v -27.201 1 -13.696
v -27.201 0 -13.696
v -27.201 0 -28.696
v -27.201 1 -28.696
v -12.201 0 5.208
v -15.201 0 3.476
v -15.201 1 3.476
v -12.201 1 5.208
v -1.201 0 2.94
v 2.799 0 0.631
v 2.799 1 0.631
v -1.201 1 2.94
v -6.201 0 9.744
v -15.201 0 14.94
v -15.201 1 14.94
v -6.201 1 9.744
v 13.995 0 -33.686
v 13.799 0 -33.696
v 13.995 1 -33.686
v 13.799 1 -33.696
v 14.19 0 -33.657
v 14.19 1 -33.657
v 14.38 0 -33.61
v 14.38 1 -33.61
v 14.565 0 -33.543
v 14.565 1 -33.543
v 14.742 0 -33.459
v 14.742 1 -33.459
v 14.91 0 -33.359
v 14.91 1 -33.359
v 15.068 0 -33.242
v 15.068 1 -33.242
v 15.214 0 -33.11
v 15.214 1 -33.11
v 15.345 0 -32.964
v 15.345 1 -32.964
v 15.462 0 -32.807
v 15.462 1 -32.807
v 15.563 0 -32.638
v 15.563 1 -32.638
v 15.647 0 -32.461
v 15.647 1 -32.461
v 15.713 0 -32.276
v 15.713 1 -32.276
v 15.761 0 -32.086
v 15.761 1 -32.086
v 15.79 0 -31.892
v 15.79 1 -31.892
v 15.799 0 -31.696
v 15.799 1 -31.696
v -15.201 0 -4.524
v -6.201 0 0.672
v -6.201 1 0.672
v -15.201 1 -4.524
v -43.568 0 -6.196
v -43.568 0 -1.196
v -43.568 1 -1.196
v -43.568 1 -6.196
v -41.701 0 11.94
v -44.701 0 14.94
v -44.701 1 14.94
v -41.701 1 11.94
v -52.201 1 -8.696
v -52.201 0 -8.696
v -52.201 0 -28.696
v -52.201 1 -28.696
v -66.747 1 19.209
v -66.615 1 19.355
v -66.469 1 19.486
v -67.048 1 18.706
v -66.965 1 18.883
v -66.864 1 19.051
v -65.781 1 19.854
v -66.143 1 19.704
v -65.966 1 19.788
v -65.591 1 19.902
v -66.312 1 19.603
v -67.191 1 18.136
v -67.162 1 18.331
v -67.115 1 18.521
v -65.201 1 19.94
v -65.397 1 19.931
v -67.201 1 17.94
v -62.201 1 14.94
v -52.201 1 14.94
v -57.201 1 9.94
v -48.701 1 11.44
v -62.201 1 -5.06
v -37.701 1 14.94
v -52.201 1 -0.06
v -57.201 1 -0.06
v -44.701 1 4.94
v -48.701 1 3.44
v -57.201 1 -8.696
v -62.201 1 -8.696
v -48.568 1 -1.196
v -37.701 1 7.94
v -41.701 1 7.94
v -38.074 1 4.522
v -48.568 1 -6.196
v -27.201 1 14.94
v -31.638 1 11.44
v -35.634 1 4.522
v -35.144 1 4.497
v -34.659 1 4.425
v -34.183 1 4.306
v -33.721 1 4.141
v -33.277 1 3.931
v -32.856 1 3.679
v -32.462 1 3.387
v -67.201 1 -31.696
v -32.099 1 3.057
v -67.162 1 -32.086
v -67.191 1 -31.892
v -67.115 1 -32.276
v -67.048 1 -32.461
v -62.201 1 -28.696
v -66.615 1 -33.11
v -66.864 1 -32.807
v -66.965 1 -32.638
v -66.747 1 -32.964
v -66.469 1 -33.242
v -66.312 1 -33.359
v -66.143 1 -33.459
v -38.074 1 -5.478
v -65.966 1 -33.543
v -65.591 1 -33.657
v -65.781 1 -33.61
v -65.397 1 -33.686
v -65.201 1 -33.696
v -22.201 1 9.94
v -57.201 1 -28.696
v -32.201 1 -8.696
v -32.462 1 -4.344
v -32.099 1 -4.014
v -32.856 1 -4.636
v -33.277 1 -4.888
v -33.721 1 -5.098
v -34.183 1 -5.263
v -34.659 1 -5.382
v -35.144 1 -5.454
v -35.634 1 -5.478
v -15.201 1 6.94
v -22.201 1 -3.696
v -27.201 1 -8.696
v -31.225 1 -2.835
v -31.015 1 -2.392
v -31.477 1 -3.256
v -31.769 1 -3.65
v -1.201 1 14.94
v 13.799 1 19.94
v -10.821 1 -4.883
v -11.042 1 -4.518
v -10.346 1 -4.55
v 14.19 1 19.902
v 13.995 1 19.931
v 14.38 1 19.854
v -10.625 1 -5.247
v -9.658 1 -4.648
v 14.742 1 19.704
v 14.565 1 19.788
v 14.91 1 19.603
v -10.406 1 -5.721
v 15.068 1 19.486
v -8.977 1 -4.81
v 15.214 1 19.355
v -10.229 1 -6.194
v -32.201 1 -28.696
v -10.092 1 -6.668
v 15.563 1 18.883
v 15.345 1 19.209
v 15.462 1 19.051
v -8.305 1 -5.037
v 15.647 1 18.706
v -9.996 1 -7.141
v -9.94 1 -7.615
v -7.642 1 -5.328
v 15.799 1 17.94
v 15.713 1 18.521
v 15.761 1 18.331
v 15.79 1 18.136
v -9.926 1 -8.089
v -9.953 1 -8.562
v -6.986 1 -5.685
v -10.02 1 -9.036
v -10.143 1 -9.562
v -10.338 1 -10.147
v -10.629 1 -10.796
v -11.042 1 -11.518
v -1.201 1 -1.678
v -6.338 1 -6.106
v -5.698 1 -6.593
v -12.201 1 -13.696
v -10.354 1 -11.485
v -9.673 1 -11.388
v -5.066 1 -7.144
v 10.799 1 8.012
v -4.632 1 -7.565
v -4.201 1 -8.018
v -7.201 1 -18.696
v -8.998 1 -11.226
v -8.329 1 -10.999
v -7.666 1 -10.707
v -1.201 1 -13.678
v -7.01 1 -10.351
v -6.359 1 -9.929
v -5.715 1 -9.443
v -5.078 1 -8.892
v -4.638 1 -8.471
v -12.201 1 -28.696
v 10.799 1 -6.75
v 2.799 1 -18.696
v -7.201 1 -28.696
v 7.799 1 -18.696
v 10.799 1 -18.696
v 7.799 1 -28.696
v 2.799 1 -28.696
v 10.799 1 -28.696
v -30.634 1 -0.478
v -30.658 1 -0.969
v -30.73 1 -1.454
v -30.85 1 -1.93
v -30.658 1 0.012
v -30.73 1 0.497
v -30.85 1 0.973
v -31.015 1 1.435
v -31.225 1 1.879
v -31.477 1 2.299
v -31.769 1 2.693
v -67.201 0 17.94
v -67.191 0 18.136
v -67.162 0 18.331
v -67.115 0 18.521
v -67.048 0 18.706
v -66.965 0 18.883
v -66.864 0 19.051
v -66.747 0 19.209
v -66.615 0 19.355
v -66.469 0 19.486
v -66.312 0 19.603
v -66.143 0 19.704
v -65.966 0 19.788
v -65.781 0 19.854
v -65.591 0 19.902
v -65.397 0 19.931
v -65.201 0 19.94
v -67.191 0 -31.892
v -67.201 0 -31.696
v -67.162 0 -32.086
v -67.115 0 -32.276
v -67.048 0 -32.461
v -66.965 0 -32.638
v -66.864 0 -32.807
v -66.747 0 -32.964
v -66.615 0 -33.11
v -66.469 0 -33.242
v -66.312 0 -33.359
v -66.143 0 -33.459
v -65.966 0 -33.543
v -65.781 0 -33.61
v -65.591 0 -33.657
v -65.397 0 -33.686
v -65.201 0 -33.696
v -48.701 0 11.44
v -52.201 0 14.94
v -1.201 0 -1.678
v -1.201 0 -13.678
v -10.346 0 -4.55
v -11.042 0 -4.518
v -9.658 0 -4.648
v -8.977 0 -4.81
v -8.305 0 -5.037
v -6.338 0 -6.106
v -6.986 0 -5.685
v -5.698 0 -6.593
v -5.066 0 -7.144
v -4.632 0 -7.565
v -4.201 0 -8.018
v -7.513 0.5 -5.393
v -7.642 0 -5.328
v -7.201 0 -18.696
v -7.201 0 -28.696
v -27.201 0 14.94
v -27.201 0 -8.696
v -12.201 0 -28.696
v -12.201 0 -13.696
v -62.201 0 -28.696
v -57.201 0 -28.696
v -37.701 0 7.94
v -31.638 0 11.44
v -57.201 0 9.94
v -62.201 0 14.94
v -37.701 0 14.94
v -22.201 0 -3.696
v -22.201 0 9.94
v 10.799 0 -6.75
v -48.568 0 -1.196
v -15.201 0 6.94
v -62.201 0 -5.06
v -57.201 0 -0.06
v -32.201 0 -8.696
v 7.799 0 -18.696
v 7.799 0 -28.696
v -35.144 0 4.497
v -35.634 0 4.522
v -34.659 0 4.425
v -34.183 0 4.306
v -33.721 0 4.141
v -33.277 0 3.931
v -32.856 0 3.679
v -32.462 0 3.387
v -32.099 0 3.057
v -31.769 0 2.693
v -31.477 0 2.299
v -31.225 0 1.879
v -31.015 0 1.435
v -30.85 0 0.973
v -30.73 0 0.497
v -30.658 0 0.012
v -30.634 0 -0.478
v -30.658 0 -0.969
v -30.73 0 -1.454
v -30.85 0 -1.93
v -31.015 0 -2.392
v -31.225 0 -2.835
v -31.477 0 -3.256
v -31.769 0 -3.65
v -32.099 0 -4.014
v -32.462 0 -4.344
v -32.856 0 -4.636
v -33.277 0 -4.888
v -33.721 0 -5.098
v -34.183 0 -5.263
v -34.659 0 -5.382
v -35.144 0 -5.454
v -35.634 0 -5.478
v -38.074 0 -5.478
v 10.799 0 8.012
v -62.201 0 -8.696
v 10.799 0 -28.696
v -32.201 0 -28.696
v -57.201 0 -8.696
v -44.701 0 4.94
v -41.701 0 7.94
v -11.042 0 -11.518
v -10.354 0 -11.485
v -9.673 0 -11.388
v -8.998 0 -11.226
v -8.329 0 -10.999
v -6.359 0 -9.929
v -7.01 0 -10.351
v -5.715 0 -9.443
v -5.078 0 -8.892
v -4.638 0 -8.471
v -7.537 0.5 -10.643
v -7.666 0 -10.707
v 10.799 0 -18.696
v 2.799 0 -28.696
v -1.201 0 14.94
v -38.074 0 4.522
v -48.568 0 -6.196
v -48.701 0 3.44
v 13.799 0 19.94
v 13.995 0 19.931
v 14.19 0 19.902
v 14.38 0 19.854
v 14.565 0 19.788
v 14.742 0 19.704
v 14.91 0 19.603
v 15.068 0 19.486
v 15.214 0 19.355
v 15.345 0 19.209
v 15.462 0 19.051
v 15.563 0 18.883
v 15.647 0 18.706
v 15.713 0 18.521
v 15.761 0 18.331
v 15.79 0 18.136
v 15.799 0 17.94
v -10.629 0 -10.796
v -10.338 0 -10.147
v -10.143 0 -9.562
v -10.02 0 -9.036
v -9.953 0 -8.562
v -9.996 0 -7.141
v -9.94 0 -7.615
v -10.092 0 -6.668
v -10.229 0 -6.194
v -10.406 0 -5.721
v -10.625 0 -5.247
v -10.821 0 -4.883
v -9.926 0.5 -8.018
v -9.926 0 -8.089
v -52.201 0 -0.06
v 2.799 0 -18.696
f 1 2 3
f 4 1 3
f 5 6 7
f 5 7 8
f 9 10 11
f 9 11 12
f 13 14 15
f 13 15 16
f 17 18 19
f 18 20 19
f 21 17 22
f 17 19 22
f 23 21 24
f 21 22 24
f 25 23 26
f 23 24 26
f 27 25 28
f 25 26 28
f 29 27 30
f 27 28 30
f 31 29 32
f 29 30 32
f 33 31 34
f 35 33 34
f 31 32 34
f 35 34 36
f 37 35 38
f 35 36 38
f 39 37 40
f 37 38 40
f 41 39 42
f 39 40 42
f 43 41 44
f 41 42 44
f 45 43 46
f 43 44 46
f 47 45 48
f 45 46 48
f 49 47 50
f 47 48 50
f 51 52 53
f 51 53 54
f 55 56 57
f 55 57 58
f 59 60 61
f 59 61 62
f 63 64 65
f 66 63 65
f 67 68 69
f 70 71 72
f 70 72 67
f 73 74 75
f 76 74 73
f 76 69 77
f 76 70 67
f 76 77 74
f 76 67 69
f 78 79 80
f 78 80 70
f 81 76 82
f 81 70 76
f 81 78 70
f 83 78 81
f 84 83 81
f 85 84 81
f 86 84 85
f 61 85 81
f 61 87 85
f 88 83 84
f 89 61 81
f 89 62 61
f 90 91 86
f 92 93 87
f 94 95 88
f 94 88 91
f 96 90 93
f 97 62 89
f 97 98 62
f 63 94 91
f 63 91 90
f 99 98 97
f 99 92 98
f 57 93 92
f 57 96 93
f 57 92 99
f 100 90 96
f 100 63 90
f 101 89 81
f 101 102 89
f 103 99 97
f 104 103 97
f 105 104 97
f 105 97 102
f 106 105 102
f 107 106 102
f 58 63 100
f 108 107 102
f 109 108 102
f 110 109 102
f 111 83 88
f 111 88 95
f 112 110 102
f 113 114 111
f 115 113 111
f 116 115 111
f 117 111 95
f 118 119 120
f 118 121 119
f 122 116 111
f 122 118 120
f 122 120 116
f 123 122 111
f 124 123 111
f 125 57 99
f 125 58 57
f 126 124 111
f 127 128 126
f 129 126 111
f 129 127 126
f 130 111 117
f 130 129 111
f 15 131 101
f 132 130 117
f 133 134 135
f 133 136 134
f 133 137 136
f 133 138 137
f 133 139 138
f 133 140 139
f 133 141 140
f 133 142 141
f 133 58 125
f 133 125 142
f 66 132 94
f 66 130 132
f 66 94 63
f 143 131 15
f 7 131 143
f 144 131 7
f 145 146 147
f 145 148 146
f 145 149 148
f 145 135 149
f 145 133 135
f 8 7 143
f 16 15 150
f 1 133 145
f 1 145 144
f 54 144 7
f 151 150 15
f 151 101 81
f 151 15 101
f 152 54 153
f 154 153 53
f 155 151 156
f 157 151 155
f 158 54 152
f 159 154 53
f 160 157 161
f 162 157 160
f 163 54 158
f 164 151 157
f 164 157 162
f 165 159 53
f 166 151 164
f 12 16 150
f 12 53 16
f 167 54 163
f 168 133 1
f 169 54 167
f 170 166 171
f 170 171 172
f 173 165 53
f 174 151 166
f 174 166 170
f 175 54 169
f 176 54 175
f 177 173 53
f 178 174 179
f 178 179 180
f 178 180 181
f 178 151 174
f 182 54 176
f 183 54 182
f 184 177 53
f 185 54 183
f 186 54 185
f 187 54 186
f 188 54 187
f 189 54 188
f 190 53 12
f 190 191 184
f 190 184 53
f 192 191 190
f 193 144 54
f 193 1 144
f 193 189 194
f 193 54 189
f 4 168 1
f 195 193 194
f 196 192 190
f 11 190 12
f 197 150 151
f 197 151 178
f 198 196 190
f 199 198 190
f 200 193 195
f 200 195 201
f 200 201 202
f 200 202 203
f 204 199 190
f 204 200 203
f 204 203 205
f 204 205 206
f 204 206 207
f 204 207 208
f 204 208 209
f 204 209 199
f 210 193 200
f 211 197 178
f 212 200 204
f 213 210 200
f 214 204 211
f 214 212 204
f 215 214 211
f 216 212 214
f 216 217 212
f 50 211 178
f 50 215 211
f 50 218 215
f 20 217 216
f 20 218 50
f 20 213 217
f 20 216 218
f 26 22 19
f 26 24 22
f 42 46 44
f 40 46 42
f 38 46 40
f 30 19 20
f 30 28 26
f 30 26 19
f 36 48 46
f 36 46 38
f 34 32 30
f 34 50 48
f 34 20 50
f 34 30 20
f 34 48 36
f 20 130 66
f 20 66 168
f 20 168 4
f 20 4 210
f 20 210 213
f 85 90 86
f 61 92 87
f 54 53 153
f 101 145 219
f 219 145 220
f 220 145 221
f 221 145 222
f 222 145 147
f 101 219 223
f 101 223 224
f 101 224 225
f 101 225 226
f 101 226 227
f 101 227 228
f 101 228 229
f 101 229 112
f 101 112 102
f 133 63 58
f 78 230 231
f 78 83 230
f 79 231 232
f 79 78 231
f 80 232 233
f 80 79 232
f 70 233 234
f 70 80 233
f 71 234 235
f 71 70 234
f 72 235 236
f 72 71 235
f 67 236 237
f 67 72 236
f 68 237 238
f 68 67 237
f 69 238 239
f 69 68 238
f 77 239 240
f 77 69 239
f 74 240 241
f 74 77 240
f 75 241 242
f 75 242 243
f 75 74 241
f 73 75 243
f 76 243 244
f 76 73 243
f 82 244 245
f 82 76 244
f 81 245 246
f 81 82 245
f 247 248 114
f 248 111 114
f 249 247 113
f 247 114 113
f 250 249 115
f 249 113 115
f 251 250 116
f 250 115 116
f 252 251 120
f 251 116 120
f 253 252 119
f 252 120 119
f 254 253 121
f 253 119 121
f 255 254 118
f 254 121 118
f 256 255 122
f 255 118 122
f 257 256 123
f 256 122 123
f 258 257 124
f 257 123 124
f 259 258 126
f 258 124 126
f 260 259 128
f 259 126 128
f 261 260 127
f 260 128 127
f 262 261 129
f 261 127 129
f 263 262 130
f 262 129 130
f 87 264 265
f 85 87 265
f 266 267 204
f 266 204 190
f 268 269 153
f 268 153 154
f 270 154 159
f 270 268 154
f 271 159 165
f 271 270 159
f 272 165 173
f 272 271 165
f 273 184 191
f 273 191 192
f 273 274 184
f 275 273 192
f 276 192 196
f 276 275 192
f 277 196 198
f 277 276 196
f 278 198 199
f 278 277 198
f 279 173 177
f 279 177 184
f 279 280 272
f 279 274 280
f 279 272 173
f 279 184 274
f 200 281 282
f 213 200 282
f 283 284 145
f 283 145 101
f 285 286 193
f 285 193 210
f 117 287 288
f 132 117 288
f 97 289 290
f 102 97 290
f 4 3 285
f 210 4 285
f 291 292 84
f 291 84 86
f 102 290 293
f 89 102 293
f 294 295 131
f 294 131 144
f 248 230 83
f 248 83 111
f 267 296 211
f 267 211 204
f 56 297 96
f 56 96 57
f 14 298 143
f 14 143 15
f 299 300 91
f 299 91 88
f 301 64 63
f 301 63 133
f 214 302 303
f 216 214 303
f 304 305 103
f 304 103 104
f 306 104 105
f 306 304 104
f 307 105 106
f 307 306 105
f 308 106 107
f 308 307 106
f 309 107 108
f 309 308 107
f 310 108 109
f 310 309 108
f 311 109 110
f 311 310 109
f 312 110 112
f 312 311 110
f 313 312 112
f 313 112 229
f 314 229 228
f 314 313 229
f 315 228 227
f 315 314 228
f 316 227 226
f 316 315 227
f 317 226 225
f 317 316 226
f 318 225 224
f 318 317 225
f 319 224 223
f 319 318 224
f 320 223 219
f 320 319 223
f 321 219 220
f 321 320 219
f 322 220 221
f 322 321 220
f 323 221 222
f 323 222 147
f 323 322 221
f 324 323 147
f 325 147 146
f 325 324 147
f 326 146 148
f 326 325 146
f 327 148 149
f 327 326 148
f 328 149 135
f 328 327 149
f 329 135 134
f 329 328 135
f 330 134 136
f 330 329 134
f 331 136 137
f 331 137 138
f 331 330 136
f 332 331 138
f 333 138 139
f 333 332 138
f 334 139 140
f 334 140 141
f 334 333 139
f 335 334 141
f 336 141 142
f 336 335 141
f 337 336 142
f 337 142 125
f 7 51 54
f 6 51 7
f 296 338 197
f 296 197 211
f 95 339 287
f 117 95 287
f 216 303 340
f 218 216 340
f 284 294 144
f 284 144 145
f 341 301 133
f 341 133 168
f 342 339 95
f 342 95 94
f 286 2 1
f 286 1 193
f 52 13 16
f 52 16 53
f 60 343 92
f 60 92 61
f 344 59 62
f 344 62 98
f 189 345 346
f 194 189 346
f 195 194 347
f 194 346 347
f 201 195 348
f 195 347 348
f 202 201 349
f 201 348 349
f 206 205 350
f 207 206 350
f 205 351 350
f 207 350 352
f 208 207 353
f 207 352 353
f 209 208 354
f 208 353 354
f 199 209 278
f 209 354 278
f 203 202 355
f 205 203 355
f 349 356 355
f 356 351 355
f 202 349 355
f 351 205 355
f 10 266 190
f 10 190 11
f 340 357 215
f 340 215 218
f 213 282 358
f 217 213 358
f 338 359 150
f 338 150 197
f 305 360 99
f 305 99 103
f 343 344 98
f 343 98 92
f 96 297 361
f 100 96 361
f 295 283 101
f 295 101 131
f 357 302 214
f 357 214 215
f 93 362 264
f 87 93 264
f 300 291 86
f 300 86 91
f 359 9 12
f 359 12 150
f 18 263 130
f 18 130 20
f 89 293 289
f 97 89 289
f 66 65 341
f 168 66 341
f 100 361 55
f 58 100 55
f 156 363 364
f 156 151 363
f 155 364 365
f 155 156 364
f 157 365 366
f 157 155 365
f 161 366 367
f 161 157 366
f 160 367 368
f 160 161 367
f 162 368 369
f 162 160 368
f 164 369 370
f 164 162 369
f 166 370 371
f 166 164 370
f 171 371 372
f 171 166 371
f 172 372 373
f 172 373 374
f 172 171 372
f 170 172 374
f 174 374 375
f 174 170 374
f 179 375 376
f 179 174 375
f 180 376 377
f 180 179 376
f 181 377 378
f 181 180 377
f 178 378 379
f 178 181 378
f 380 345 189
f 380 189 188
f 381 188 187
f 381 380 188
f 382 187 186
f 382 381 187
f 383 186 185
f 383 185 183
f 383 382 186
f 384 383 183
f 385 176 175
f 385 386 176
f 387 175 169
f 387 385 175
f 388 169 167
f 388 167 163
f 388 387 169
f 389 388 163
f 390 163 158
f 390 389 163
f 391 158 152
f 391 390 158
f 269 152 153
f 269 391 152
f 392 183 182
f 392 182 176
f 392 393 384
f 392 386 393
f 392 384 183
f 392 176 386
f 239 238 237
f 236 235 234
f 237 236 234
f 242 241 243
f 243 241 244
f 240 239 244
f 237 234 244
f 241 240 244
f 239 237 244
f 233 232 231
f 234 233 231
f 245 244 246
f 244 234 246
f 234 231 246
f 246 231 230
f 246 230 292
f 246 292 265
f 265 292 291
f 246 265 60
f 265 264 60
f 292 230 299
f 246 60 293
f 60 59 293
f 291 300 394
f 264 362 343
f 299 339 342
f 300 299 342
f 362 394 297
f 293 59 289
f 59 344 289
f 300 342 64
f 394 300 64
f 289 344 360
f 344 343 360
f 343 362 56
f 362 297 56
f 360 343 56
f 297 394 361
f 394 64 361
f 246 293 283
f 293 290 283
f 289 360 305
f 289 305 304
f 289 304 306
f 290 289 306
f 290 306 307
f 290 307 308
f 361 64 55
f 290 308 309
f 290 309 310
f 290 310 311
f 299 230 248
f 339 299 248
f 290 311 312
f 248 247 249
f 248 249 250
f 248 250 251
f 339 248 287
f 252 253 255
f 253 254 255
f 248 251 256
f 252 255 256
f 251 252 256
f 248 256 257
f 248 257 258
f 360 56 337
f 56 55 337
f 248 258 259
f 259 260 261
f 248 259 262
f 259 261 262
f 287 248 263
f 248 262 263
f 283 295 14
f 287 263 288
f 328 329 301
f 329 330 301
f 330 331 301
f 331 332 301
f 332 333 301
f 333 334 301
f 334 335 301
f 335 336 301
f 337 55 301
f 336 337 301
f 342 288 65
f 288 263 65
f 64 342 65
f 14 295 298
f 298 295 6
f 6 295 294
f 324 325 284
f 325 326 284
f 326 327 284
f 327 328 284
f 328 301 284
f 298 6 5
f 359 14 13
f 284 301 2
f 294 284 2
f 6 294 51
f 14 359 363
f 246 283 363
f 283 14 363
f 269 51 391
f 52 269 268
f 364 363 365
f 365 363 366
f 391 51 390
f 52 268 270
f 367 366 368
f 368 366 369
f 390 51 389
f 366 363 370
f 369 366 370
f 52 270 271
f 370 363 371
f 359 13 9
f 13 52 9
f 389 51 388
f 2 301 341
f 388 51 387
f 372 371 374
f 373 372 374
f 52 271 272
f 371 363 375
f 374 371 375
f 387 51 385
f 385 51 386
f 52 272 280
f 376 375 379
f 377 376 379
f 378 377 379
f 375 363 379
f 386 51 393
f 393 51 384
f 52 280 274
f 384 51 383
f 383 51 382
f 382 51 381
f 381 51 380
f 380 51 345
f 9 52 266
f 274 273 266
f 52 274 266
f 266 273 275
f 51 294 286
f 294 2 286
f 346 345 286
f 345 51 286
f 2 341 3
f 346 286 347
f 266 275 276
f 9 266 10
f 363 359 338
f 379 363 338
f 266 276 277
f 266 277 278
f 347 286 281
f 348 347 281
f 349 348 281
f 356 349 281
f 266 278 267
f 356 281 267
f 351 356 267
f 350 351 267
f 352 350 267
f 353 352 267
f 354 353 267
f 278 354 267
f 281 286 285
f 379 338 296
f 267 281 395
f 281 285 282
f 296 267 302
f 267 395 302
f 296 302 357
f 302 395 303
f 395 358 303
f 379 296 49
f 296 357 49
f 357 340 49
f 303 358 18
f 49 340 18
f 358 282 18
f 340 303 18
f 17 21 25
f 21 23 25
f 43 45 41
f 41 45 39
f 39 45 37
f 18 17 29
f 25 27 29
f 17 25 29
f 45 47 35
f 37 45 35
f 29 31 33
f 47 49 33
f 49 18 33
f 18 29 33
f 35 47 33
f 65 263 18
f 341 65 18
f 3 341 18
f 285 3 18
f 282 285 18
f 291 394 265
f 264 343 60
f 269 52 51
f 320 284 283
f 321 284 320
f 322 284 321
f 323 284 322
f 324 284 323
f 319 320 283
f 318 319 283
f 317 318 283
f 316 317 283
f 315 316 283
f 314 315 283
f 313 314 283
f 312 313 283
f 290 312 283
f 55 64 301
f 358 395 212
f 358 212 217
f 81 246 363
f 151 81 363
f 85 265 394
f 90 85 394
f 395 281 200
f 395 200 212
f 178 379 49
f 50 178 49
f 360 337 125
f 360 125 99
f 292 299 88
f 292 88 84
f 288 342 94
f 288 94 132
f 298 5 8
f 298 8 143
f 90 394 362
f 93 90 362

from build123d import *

# Parameters (mm, degrees)
SKETCH1_W           = 83
SKETCH1_H           = 53.635971978
SKETCH1_W_2         = 20
SKETCH1_H_2         = 20
SKETCH1_W_3         = 15
SKETCH1_H_3         = 15
SKETCH1_W_4         = 10
SKETCH1_H_4         = 10
SKETCH1_W_5         = 5
SKETCH1_W_6         = 3
SKETCH1_H_5         = 5
BOSS_EXTRUDE1_DEPTH = 1
FILLET1_R           = 2


with BuildPart() as part:
    # Sketch1 → Boss-Extrude1 (new body)
    with BuildSketch(Plane(origin=(0, 0, 0), x_dir=(1, 0, 0), z_dir=(0, 1, 0))):
        with Locations((-25.700677223, 6.877666185)):
            Rectangle(SKETCH1_W, SKETCH1_H)
        Polygon((-62.200677223, 5.059680196), (-62.200677223, -14.940319804), (-57.200677223, -9.940319804), (-57.200677223, 0.059680196), align=None, mode=Mode.SUBTRACT)
        with Locations((-42.200677223, 18.695652174)):
            Rectangle(SKETCH1_W_2, SKETCH1_H_2, mode=Mode.SUBTRACT)
        with Locations((-19.700677223, 21.195652174)):
            Rectangle(SKETCH1_W_3, SKETCH1_H_3, mode=Mode.SUBTRACT)
        with Locations((-2.200677223, 23.695652174)):
            Rectangle(SKETCH1_W_4, SKETCH1_H_4, mode=Mode.SUBTRACT)
        with Locations((-59.700677223, 18.695652174)):
            Rectangle(SKETCH1_W_5, SKETCH1_H_2, mode=Mode.SUBTRACT)
        with Locations((9.299322777, 23.695652174)):
            Rectangle(SKETCH1_W_6, SKETCH1_H_4, mode=Mode.SUBTRACT)
        Polygon((-52.200677223, -14.940319804), (-52.200677223, 0.059680196), (-48.700677223, -3.440319804), (-48.700677223, -11.440319804), align=None, mode=Mode.SUBTRACT)
        Polygon((-44.700677223, -4.940319804), (-44.700677223, -14.940319804), (-41.700677223, -11.940319804), (-41.700677223, -7.940319804), align=None, mode=Mode.SUBTRACT)
        Polygon((-1.200677223, 13.67848235), (-1.200677223, 1.67848235), (2.799322777, -0.630918727), (-1.200677223, -2.940319804), (-1.200677223, -14.940319804), (10.799322777, -8.012116573), (10.799322777, 6.750279119), align=None, mode=Mode.SUBTRACT)
        Polygon((-15.200677223, 4.523781811), (-15.200677223, -3.476218189), (-12.200677223, -5.208268996), (-15.200677223, -6.940319804), (-15.200677223, -14.940319804), (-6.200677223, -9.744167381), (-6.200677223, -0.672370611), align=None, mode=Mode.SUBTRACT)
        Polygon((-27.200677223, 8.695652174), (-27.200677223, -14.940319804), (-22.200677223, -9.940319804), (-22.200677223, 3.695652174), align=None, mode=Mode.SUBTRACT)
        Polygon((-37.700677223, -14.940319804), (-37.700677223, -7.940319804), (-31.638499397, -11.440319804), align=None, mode=Mode.SUBTRACT)
        with Locations((-46.067733945, 3.695652174)):
            Rectangle(SKETCH1_W_5, SKETCH1_H_5, mode=Mode.SUBTRACT)
        with BuildLine():
            Line((-35.634253982, 5.478469437), (-38.073838133, 5.478469437))
            Line((-38.073838133, 5.478469437), (-38.073838133, -4.521530563))
            Line((-38.073838133, -4.521530563), (-35.634253982, -4.521530563))
            ThreePointArc((-35.634253982, -4.521530563), (-30.634253982, 0.478469437), (-35.634253982, 5.478469437))
        make_face(mode=Mode.SUBTRACT)
        with BuildLine():
            add(Edge.make_bspline(
                [(-11.041888769, 11.517886634), (-8.809163486, 8.017886634), (-11.041888769, 4.517886634)],
                knots=[0, 0, 0, 1, 1, 1], degree=2))
            add(Edge.make_bspline(
                [(-11.041888769, 4.517886634), (-7.404142371, 4.517886634), (-4.201433986, 8.017886634)],
                knots=[0, 0, 0, 1, 1, 1], degree=2))
            add(Edge.make_bspline(
                [(-11.041888769, 11.517886634), (-7.453218548, 11.517886634), (-4.201433986, 8.017886634)],
                knots=[0, 0, 0, 1, 1, 1], degree=2))
        make_face(mode=Mode.SUBTRACT)
    extrude(amount=BOSS_EXTRUDE1_DEPTH)

    # Fillet1
    fillet1_edges = [part.edges().sort_by_distance(p)[0] for p in [
        (-67.200677223, 0.5, -33.695652174),
        (15.799322777, 0.5, -33.695652174),
        (15.799322777, 0.5, 19.940319804),
        (-67.200677223, 0.5, 19.940319804),
    ]]
    fillet(fillet1_edges, radius=FILLET1_R)


solid = part.part
